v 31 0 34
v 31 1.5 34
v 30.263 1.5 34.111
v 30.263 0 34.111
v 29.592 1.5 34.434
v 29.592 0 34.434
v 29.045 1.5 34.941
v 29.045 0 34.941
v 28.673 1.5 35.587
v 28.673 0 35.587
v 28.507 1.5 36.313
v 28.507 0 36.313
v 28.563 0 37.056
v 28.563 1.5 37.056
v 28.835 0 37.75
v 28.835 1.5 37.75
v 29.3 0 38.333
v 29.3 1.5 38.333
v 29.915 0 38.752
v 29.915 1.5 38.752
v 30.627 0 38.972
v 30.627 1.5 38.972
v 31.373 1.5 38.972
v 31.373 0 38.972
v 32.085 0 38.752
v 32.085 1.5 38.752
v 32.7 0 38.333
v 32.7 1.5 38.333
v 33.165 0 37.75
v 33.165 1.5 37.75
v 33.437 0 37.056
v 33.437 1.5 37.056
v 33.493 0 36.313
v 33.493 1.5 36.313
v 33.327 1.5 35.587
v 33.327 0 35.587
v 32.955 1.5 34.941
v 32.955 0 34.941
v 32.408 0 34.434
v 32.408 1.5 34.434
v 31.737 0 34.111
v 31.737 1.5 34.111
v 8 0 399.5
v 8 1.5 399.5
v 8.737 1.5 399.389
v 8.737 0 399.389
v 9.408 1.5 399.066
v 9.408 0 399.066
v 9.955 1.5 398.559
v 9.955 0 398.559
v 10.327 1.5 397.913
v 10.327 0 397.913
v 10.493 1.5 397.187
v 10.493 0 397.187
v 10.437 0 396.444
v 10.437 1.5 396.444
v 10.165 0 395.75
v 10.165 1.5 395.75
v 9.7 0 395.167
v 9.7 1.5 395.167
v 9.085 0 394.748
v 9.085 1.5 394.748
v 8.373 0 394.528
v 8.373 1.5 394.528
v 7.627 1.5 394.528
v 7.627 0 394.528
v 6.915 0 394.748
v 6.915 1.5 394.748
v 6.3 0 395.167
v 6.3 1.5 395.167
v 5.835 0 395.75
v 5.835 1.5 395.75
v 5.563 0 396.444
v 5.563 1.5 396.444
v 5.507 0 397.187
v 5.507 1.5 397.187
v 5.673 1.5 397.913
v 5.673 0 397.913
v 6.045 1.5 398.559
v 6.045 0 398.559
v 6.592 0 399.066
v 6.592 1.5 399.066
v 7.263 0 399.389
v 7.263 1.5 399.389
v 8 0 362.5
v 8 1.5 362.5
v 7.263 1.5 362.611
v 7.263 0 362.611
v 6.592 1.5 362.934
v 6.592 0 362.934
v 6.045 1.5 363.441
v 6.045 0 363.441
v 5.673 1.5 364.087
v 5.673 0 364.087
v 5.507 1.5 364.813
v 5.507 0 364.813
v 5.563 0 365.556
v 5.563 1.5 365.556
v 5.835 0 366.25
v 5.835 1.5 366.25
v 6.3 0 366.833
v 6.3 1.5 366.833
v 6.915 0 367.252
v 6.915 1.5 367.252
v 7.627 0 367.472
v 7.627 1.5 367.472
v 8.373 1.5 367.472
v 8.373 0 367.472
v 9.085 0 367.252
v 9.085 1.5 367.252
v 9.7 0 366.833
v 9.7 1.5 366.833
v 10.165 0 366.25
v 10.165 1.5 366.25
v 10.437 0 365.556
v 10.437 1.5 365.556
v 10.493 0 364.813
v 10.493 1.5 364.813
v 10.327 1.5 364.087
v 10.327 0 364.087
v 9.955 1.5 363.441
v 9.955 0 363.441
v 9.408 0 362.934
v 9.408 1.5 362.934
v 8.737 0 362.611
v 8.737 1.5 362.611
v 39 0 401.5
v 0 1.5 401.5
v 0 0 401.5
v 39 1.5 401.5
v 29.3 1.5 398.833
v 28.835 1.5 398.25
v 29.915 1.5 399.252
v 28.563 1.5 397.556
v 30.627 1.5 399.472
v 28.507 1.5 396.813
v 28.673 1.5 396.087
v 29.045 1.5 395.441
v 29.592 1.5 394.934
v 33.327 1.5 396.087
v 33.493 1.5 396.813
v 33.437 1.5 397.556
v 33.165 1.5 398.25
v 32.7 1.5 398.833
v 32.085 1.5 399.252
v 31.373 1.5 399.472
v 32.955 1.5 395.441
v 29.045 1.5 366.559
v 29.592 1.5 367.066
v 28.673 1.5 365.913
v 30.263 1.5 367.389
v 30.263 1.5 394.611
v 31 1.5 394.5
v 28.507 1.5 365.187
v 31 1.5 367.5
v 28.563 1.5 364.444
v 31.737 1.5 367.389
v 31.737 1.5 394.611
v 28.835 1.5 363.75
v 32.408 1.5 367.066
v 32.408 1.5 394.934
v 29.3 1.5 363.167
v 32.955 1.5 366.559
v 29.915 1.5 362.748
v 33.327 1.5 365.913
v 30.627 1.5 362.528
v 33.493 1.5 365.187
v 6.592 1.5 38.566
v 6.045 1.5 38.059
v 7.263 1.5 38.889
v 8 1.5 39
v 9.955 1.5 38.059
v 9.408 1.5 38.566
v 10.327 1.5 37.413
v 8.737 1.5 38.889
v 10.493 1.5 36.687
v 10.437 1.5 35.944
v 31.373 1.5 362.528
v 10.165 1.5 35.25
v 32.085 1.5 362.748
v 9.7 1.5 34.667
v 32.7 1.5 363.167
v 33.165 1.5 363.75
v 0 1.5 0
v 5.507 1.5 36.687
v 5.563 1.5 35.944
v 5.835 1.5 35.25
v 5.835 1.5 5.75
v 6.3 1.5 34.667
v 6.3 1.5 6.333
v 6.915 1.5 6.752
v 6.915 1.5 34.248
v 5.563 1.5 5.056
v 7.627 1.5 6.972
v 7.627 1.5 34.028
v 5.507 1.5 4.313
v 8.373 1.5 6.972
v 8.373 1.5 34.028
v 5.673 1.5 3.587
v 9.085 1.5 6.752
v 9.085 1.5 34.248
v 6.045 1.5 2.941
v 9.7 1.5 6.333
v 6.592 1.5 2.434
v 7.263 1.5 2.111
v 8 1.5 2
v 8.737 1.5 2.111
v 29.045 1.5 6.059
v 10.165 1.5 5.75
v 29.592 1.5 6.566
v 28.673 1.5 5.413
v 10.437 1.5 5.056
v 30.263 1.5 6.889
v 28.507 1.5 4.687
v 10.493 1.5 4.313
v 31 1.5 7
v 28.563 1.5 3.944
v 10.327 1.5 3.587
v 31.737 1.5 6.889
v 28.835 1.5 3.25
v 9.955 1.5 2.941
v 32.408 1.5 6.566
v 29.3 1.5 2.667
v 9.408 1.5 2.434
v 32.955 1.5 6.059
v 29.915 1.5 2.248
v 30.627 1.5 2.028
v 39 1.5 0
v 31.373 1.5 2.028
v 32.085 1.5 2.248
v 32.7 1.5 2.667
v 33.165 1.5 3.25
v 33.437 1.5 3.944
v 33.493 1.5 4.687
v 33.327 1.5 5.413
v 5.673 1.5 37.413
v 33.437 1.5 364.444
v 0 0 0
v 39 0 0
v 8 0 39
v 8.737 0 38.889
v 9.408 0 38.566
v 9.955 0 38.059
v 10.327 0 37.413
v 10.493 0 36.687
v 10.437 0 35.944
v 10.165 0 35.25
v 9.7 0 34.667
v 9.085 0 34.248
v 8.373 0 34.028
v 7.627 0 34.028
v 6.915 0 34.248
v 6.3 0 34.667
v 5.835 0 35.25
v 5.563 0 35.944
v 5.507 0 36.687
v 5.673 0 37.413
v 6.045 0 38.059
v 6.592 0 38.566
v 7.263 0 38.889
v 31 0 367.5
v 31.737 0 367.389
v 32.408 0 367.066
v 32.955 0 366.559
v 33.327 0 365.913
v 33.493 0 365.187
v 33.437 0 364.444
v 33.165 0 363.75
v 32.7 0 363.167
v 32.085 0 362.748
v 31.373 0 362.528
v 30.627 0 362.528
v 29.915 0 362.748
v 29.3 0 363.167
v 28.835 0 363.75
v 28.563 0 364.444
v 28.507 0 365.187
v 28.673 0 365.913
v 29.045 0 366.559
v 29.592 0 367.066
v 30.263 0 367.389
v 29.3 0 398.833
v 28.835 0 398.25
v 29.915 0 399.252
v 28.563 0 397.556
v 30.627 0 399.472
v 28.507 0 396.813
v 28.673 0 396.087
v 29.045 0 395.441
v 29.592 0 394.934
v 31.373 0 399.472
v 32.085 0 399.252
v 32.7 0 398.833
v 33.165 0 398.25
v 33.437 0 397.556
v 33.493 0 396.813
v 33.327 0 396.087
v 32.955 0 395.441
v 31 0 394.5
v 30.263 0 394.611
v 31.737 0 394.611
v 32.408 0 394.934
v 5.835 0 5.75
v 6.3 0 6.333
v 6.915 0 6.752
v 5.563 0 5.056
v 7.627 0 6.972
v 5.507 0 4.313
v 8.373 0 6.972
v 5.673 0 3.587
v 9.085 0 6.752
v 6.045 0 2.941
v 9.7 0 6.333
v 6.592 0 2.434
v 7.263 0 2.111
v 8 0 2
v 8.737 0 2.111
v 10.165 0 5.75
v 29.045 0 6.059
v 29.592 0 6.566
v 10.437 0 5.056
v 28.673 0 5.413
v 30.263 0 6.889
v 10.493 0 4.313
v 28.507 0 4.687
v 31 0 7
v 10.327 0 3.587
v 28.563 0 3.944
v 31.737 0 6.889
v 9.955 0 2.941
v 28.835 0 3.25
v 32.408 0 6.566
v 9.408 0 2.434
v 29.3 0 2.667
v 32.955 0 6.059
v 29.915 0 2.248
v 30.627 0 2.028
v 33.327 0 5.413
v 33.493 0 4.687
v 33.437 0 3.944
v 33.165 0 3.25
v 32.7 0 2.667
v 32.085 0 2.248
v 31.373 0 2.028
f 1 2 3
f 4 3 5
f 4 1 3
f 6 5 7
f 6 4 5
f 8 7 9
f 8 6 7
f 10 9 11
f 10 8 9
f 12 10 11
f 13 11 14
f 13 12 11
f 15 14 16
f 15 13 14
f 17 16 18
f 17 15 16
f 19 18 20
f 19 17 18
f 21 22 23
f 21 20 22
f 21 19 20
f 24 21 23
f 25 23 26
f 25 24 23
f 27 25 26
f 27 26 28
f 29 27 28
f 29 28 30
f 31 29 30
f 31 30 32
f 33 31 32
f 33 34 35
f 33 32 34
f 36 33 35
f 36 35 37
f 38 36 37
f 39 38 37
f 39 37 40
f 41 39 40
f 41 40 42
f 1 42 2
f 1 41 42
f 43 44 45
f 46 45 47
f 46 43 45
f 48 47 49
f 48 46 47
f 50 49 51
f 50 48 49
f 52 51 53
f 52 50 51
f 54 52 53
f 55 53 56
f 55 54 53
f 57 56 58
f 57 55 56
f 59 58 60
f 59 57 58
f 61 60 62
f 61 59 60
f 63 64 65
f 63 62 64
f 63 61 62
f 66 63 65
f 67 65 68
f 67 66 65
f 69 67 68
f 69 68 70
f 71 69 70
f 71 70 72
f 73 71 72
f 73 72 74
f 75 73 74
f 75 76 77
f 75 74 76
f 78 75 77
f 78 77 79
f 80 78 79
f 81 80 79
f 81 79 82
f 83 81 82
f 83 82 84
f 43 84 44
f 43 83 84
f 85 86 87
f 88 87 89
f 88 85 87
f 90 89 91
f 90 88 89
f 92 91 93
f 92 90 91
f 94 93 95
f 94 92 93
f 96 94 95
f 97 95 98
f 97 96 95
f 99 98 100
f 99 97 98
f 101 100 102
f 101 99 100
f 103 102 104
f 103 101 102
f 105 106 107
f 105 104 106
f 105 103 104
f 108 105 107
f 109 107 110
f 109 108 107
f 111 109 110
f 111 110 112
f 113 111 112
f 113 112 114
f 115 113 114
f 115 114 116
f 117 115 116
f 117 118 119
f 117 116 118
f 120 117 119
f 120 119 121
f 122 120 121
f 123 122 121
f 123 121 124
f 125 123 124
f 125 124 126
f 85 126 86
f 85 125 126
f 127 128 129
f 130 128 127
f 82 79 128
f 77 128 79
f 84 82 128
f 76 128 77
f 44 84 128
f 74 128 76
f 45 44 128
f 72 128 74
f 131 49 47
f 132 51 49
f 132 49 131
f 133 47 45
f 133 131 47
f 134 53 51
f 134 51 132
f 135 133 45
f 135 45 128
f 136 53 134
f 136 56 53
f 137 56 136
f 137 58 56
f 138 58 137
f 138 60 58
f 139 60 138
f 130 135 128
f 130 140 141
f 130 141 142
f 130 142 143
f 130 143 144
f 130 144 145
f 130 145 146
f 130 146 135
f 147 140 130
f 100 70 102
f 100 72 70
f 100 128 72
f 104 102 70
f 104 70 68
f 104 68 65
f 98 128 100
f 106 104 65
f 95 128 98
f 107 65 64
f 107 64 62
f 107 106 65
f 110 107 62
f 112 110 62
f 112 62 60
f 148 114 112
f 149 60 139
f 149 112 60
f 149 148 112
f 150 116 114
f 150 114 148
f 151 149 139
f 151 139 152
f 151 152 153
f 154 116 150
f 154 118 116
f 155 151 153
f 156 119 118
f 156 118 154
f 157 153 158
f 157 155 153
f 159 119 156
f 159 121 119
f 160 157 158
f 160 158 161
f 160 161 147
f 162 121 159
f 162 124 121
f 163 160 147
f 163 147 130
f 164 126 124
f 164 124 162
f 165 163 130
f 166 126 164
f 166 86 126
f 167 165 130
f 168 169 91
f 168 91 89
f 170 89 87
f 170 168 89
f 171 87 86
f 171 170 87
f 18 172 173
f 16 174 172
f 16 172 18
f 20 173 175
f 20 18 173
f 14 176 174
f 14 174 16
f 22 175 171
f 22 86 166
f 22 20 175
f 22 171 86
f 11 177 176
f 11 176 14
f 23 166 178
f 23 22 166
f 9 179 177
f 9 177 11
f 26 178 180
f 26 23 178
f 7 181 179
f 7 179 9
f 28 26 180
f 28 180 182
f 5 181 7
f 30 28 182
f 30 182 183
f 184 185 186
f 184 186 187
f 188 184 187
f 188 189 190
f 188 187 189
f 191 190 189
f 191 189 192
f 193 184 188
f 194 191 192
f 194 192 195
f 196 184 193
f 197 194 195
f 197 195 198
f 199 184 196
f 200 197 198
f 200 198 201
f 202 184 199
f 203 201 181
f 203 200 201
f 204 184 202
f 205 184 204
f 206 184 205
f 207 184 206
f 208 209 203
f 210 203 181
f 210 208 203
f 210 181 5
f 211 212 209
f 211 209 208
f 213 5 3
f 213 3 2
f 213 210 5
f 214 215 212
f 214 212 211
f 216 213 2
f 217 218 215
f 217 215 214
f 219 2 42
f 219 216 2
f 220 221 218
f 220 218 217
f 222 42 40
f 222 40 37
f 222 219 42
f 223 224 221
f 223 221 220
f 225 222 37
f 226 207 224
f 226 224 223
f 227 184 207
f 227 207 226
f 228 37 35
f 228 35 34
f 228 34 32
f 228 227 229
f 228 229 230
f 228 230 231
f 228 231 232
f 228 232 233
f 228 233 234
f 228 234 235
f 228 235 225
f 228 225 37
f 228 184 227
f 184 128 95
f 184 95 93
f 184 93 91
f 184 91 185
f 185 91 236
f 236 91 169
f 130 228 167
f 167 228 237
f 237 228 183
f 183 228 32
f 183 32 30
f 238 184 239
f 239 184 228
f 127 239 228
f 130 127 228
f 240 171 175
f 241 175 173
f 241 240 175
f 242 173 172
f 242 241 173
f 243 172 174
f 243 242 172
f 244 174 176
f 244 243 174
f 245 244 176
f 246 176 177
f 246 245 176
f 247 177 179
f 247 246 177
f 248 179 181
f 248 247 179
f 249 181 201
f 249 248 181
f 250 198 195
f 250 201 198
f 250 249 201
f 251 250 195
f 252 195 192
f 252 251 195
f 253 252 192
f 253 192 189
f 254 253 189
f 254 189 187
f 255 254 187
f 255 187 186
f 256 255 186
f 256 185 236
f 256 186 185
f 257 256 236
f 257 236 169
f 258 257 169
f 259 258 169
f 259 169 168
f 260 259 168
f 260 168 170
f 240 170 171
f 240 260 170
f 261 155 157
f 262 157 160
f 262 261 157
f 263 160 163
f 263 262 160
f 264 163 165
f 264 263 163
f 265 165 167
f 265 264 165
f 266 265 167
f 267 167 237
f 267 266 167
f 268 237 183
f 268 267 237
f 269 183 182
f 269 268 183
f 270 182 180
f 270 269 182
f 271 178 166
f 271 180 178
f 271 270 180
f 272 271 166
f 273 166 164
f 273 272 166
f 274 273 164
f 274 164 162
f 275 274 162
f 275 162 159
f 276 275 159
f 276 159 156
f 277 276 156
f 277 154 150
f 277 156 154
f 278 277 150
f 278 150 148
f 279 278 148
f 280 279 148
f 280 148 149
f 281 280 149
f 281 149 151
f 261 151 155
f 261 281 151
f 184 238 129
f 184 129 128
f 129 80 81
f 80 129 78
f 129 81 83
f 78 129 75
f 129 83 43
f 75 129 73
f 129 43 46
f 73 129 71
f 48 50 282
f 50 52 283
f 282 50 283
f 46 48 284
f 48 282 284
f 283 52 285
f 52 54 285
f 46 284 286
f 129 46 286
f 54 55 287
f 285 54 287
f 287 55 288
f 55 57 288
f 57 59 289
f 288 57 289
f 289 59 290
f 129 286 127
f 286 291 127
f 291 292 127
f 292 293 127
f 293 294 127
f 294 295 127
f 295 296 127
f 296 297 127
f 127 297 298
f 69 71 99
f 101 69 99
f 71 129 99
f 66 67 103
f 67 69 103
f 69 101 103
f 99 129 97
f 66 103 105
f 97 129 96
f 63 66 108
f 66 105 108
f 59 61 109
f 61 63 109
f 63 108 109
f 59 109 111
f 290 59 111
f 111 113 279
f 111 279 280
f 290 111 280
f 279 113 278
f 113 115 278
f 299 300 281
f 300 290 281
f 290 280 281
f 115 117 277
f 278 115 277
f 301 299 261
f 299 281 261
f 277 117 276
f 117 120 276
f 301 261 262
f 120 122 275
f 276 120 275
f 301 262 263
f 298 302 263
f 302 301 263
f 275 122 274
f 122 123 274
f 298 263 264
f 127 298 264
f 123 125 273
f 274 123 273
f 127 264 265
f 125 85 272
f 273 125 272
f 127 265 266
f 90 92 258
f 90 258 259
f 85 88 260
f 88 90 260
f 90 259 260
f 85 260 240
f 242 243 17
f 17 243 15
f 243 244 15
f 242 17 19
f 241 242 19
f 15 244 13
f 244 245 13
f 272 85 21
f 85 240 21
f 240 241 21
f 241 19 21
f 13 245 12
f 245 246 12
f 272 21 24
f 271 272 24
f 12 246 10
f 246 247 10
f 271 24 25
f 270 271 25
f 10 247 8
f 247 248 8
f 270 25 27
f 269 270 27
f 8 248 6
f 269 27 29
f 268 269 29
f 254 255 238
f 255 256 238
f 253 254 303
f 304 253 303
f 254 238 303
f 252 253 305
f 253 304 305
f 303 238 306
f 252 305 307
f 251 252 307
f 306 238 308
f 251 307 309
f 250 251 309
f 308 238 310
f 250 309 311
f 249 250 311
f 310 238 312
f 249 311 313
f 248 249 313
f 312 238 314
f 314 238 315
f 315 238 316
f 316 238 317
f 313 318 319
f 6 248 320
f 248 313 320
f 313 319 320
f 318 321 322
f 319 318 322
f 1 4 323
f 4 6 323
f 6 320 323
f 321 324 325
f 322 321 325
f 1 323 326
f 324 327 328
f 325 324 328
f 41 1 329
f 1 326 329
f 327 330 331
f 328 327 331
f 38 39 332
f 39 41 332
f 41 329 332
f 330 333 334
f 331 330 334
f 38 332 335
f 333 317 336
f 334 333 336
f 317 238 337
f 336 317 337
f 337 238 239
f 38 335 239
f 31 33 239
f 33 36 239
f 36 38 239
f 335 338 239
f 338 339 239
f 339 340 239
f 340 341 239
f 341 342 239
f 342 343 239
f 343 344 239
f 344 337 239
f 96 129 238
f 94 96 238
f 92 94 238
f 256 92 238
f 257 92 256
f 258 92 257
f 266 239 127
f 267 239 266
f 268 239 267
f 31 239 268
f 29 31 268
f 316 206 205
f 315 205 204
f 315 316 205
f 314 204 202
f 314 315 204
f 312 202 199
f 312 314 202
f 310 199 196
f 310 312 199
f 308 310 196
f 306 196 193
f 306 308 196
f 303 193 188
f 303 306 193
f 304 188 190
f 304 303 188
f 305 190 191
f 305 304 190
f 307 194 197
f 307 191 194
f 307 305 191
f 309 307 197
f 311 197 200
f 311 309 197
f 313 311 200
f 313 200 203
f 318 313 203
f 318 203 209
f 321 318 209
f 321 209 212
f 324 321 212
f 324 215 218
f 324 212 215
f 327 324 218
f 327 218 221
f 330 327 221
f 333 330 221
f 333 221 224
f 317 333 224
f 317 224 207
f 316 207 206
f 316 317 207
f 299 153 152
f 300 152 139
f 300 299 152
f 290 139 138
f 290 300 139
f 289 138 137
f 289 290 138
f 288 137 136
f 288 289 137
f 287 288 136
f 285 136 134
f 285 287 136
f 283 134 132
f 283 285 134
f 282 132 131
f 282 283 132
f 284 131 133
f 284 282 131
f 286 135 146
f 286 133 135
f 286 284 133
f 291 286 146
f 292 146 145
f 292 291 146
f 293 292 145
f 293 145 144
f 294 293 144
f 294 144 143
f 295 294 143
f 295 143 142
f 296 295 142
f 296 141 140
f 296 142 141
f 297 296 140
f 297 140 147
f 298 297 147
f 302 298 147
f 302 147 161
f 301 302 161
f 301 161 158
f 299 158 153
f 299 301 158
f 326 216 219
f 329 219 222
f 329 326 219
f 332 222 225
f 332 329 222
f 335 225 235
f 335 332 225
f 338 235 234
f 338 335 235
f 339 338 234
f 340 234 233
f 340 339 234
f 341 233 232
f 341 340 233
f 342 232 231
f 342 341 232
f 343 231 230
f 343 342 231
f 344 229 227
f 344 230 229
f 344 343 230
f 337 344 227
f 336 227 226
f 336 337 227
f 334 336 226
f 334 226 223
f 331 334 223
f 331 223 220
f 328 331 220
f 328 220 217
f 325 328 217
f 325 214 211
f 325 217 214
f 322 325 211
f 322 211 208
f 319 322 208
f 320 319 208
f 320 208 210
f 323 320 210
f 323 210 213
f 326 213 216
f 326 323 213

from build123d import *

# Parameters (mm, degrees)
ESQUISSE1_W             = 39
ESQUISSE1_H             = 1.5
BOSS_EXTRU_1_DEPTH      = 401.5
ESQUISSE2_R             = 2.5
ENL_V_MAT_EXTRU_1_DEPTH = 404.392488775


with BuildPart() as part:
    # Esquisse1 → Boss.-Extru.1 (new body)
    with BuildSketch(Plane.XY):
        with Locations((19.5, 0.75)):
            Rectangle(ESQUISSE1_W, ESQUISSE1_H)
    extrude(amount=BOSS_EXTRU_1_DEPTH)

    # Esquisse2 → Enlèv. mat.-Extru.1 (cut, through all)
    with BuildSketch(Plane(origin=(0, 0, 0), x_dir=(1, 0, 0), z_dir=(0, 1, 0))):
        with Locations(Location((8, -397, 0), (0, 0, 270))):
            Circle(ESQUISSE2_R)
        with Locations(Location((31, -365, 0), (0, 0, 270))):
            Circle(ESQUISSE2_R)
        with Locations(Location((31, -36.5, 0), (0, 0, 90))):
            Circle(ESQUISSE2_R)
        with Locations(Location((8, -4.5, 0), (0, 0, 90))):
            Circle(ESQUISSE2_R)
        with Locations(Location((8, -36.5, 0), (0, 0, 270))):
            Circle(ESQUISSE2_R)
        with Locations(Location((31, -4.5, 0), (0, 0, 270))):
            Circle(ESQUISSE2_R)
        with Locations(Location((8, -365, 0), (0, 0, 90))):
            Circle(ESQUISSE2_R)
        with Locations(Location((31, -397, 0), (0, 0, 90))):
            Circle(ESQUISSE2_R)
    extrude(amount=ENL_V_MAT_EXTRU_1_DEPTH, mode=Mode.SUBTRACT)


solid = part.part
